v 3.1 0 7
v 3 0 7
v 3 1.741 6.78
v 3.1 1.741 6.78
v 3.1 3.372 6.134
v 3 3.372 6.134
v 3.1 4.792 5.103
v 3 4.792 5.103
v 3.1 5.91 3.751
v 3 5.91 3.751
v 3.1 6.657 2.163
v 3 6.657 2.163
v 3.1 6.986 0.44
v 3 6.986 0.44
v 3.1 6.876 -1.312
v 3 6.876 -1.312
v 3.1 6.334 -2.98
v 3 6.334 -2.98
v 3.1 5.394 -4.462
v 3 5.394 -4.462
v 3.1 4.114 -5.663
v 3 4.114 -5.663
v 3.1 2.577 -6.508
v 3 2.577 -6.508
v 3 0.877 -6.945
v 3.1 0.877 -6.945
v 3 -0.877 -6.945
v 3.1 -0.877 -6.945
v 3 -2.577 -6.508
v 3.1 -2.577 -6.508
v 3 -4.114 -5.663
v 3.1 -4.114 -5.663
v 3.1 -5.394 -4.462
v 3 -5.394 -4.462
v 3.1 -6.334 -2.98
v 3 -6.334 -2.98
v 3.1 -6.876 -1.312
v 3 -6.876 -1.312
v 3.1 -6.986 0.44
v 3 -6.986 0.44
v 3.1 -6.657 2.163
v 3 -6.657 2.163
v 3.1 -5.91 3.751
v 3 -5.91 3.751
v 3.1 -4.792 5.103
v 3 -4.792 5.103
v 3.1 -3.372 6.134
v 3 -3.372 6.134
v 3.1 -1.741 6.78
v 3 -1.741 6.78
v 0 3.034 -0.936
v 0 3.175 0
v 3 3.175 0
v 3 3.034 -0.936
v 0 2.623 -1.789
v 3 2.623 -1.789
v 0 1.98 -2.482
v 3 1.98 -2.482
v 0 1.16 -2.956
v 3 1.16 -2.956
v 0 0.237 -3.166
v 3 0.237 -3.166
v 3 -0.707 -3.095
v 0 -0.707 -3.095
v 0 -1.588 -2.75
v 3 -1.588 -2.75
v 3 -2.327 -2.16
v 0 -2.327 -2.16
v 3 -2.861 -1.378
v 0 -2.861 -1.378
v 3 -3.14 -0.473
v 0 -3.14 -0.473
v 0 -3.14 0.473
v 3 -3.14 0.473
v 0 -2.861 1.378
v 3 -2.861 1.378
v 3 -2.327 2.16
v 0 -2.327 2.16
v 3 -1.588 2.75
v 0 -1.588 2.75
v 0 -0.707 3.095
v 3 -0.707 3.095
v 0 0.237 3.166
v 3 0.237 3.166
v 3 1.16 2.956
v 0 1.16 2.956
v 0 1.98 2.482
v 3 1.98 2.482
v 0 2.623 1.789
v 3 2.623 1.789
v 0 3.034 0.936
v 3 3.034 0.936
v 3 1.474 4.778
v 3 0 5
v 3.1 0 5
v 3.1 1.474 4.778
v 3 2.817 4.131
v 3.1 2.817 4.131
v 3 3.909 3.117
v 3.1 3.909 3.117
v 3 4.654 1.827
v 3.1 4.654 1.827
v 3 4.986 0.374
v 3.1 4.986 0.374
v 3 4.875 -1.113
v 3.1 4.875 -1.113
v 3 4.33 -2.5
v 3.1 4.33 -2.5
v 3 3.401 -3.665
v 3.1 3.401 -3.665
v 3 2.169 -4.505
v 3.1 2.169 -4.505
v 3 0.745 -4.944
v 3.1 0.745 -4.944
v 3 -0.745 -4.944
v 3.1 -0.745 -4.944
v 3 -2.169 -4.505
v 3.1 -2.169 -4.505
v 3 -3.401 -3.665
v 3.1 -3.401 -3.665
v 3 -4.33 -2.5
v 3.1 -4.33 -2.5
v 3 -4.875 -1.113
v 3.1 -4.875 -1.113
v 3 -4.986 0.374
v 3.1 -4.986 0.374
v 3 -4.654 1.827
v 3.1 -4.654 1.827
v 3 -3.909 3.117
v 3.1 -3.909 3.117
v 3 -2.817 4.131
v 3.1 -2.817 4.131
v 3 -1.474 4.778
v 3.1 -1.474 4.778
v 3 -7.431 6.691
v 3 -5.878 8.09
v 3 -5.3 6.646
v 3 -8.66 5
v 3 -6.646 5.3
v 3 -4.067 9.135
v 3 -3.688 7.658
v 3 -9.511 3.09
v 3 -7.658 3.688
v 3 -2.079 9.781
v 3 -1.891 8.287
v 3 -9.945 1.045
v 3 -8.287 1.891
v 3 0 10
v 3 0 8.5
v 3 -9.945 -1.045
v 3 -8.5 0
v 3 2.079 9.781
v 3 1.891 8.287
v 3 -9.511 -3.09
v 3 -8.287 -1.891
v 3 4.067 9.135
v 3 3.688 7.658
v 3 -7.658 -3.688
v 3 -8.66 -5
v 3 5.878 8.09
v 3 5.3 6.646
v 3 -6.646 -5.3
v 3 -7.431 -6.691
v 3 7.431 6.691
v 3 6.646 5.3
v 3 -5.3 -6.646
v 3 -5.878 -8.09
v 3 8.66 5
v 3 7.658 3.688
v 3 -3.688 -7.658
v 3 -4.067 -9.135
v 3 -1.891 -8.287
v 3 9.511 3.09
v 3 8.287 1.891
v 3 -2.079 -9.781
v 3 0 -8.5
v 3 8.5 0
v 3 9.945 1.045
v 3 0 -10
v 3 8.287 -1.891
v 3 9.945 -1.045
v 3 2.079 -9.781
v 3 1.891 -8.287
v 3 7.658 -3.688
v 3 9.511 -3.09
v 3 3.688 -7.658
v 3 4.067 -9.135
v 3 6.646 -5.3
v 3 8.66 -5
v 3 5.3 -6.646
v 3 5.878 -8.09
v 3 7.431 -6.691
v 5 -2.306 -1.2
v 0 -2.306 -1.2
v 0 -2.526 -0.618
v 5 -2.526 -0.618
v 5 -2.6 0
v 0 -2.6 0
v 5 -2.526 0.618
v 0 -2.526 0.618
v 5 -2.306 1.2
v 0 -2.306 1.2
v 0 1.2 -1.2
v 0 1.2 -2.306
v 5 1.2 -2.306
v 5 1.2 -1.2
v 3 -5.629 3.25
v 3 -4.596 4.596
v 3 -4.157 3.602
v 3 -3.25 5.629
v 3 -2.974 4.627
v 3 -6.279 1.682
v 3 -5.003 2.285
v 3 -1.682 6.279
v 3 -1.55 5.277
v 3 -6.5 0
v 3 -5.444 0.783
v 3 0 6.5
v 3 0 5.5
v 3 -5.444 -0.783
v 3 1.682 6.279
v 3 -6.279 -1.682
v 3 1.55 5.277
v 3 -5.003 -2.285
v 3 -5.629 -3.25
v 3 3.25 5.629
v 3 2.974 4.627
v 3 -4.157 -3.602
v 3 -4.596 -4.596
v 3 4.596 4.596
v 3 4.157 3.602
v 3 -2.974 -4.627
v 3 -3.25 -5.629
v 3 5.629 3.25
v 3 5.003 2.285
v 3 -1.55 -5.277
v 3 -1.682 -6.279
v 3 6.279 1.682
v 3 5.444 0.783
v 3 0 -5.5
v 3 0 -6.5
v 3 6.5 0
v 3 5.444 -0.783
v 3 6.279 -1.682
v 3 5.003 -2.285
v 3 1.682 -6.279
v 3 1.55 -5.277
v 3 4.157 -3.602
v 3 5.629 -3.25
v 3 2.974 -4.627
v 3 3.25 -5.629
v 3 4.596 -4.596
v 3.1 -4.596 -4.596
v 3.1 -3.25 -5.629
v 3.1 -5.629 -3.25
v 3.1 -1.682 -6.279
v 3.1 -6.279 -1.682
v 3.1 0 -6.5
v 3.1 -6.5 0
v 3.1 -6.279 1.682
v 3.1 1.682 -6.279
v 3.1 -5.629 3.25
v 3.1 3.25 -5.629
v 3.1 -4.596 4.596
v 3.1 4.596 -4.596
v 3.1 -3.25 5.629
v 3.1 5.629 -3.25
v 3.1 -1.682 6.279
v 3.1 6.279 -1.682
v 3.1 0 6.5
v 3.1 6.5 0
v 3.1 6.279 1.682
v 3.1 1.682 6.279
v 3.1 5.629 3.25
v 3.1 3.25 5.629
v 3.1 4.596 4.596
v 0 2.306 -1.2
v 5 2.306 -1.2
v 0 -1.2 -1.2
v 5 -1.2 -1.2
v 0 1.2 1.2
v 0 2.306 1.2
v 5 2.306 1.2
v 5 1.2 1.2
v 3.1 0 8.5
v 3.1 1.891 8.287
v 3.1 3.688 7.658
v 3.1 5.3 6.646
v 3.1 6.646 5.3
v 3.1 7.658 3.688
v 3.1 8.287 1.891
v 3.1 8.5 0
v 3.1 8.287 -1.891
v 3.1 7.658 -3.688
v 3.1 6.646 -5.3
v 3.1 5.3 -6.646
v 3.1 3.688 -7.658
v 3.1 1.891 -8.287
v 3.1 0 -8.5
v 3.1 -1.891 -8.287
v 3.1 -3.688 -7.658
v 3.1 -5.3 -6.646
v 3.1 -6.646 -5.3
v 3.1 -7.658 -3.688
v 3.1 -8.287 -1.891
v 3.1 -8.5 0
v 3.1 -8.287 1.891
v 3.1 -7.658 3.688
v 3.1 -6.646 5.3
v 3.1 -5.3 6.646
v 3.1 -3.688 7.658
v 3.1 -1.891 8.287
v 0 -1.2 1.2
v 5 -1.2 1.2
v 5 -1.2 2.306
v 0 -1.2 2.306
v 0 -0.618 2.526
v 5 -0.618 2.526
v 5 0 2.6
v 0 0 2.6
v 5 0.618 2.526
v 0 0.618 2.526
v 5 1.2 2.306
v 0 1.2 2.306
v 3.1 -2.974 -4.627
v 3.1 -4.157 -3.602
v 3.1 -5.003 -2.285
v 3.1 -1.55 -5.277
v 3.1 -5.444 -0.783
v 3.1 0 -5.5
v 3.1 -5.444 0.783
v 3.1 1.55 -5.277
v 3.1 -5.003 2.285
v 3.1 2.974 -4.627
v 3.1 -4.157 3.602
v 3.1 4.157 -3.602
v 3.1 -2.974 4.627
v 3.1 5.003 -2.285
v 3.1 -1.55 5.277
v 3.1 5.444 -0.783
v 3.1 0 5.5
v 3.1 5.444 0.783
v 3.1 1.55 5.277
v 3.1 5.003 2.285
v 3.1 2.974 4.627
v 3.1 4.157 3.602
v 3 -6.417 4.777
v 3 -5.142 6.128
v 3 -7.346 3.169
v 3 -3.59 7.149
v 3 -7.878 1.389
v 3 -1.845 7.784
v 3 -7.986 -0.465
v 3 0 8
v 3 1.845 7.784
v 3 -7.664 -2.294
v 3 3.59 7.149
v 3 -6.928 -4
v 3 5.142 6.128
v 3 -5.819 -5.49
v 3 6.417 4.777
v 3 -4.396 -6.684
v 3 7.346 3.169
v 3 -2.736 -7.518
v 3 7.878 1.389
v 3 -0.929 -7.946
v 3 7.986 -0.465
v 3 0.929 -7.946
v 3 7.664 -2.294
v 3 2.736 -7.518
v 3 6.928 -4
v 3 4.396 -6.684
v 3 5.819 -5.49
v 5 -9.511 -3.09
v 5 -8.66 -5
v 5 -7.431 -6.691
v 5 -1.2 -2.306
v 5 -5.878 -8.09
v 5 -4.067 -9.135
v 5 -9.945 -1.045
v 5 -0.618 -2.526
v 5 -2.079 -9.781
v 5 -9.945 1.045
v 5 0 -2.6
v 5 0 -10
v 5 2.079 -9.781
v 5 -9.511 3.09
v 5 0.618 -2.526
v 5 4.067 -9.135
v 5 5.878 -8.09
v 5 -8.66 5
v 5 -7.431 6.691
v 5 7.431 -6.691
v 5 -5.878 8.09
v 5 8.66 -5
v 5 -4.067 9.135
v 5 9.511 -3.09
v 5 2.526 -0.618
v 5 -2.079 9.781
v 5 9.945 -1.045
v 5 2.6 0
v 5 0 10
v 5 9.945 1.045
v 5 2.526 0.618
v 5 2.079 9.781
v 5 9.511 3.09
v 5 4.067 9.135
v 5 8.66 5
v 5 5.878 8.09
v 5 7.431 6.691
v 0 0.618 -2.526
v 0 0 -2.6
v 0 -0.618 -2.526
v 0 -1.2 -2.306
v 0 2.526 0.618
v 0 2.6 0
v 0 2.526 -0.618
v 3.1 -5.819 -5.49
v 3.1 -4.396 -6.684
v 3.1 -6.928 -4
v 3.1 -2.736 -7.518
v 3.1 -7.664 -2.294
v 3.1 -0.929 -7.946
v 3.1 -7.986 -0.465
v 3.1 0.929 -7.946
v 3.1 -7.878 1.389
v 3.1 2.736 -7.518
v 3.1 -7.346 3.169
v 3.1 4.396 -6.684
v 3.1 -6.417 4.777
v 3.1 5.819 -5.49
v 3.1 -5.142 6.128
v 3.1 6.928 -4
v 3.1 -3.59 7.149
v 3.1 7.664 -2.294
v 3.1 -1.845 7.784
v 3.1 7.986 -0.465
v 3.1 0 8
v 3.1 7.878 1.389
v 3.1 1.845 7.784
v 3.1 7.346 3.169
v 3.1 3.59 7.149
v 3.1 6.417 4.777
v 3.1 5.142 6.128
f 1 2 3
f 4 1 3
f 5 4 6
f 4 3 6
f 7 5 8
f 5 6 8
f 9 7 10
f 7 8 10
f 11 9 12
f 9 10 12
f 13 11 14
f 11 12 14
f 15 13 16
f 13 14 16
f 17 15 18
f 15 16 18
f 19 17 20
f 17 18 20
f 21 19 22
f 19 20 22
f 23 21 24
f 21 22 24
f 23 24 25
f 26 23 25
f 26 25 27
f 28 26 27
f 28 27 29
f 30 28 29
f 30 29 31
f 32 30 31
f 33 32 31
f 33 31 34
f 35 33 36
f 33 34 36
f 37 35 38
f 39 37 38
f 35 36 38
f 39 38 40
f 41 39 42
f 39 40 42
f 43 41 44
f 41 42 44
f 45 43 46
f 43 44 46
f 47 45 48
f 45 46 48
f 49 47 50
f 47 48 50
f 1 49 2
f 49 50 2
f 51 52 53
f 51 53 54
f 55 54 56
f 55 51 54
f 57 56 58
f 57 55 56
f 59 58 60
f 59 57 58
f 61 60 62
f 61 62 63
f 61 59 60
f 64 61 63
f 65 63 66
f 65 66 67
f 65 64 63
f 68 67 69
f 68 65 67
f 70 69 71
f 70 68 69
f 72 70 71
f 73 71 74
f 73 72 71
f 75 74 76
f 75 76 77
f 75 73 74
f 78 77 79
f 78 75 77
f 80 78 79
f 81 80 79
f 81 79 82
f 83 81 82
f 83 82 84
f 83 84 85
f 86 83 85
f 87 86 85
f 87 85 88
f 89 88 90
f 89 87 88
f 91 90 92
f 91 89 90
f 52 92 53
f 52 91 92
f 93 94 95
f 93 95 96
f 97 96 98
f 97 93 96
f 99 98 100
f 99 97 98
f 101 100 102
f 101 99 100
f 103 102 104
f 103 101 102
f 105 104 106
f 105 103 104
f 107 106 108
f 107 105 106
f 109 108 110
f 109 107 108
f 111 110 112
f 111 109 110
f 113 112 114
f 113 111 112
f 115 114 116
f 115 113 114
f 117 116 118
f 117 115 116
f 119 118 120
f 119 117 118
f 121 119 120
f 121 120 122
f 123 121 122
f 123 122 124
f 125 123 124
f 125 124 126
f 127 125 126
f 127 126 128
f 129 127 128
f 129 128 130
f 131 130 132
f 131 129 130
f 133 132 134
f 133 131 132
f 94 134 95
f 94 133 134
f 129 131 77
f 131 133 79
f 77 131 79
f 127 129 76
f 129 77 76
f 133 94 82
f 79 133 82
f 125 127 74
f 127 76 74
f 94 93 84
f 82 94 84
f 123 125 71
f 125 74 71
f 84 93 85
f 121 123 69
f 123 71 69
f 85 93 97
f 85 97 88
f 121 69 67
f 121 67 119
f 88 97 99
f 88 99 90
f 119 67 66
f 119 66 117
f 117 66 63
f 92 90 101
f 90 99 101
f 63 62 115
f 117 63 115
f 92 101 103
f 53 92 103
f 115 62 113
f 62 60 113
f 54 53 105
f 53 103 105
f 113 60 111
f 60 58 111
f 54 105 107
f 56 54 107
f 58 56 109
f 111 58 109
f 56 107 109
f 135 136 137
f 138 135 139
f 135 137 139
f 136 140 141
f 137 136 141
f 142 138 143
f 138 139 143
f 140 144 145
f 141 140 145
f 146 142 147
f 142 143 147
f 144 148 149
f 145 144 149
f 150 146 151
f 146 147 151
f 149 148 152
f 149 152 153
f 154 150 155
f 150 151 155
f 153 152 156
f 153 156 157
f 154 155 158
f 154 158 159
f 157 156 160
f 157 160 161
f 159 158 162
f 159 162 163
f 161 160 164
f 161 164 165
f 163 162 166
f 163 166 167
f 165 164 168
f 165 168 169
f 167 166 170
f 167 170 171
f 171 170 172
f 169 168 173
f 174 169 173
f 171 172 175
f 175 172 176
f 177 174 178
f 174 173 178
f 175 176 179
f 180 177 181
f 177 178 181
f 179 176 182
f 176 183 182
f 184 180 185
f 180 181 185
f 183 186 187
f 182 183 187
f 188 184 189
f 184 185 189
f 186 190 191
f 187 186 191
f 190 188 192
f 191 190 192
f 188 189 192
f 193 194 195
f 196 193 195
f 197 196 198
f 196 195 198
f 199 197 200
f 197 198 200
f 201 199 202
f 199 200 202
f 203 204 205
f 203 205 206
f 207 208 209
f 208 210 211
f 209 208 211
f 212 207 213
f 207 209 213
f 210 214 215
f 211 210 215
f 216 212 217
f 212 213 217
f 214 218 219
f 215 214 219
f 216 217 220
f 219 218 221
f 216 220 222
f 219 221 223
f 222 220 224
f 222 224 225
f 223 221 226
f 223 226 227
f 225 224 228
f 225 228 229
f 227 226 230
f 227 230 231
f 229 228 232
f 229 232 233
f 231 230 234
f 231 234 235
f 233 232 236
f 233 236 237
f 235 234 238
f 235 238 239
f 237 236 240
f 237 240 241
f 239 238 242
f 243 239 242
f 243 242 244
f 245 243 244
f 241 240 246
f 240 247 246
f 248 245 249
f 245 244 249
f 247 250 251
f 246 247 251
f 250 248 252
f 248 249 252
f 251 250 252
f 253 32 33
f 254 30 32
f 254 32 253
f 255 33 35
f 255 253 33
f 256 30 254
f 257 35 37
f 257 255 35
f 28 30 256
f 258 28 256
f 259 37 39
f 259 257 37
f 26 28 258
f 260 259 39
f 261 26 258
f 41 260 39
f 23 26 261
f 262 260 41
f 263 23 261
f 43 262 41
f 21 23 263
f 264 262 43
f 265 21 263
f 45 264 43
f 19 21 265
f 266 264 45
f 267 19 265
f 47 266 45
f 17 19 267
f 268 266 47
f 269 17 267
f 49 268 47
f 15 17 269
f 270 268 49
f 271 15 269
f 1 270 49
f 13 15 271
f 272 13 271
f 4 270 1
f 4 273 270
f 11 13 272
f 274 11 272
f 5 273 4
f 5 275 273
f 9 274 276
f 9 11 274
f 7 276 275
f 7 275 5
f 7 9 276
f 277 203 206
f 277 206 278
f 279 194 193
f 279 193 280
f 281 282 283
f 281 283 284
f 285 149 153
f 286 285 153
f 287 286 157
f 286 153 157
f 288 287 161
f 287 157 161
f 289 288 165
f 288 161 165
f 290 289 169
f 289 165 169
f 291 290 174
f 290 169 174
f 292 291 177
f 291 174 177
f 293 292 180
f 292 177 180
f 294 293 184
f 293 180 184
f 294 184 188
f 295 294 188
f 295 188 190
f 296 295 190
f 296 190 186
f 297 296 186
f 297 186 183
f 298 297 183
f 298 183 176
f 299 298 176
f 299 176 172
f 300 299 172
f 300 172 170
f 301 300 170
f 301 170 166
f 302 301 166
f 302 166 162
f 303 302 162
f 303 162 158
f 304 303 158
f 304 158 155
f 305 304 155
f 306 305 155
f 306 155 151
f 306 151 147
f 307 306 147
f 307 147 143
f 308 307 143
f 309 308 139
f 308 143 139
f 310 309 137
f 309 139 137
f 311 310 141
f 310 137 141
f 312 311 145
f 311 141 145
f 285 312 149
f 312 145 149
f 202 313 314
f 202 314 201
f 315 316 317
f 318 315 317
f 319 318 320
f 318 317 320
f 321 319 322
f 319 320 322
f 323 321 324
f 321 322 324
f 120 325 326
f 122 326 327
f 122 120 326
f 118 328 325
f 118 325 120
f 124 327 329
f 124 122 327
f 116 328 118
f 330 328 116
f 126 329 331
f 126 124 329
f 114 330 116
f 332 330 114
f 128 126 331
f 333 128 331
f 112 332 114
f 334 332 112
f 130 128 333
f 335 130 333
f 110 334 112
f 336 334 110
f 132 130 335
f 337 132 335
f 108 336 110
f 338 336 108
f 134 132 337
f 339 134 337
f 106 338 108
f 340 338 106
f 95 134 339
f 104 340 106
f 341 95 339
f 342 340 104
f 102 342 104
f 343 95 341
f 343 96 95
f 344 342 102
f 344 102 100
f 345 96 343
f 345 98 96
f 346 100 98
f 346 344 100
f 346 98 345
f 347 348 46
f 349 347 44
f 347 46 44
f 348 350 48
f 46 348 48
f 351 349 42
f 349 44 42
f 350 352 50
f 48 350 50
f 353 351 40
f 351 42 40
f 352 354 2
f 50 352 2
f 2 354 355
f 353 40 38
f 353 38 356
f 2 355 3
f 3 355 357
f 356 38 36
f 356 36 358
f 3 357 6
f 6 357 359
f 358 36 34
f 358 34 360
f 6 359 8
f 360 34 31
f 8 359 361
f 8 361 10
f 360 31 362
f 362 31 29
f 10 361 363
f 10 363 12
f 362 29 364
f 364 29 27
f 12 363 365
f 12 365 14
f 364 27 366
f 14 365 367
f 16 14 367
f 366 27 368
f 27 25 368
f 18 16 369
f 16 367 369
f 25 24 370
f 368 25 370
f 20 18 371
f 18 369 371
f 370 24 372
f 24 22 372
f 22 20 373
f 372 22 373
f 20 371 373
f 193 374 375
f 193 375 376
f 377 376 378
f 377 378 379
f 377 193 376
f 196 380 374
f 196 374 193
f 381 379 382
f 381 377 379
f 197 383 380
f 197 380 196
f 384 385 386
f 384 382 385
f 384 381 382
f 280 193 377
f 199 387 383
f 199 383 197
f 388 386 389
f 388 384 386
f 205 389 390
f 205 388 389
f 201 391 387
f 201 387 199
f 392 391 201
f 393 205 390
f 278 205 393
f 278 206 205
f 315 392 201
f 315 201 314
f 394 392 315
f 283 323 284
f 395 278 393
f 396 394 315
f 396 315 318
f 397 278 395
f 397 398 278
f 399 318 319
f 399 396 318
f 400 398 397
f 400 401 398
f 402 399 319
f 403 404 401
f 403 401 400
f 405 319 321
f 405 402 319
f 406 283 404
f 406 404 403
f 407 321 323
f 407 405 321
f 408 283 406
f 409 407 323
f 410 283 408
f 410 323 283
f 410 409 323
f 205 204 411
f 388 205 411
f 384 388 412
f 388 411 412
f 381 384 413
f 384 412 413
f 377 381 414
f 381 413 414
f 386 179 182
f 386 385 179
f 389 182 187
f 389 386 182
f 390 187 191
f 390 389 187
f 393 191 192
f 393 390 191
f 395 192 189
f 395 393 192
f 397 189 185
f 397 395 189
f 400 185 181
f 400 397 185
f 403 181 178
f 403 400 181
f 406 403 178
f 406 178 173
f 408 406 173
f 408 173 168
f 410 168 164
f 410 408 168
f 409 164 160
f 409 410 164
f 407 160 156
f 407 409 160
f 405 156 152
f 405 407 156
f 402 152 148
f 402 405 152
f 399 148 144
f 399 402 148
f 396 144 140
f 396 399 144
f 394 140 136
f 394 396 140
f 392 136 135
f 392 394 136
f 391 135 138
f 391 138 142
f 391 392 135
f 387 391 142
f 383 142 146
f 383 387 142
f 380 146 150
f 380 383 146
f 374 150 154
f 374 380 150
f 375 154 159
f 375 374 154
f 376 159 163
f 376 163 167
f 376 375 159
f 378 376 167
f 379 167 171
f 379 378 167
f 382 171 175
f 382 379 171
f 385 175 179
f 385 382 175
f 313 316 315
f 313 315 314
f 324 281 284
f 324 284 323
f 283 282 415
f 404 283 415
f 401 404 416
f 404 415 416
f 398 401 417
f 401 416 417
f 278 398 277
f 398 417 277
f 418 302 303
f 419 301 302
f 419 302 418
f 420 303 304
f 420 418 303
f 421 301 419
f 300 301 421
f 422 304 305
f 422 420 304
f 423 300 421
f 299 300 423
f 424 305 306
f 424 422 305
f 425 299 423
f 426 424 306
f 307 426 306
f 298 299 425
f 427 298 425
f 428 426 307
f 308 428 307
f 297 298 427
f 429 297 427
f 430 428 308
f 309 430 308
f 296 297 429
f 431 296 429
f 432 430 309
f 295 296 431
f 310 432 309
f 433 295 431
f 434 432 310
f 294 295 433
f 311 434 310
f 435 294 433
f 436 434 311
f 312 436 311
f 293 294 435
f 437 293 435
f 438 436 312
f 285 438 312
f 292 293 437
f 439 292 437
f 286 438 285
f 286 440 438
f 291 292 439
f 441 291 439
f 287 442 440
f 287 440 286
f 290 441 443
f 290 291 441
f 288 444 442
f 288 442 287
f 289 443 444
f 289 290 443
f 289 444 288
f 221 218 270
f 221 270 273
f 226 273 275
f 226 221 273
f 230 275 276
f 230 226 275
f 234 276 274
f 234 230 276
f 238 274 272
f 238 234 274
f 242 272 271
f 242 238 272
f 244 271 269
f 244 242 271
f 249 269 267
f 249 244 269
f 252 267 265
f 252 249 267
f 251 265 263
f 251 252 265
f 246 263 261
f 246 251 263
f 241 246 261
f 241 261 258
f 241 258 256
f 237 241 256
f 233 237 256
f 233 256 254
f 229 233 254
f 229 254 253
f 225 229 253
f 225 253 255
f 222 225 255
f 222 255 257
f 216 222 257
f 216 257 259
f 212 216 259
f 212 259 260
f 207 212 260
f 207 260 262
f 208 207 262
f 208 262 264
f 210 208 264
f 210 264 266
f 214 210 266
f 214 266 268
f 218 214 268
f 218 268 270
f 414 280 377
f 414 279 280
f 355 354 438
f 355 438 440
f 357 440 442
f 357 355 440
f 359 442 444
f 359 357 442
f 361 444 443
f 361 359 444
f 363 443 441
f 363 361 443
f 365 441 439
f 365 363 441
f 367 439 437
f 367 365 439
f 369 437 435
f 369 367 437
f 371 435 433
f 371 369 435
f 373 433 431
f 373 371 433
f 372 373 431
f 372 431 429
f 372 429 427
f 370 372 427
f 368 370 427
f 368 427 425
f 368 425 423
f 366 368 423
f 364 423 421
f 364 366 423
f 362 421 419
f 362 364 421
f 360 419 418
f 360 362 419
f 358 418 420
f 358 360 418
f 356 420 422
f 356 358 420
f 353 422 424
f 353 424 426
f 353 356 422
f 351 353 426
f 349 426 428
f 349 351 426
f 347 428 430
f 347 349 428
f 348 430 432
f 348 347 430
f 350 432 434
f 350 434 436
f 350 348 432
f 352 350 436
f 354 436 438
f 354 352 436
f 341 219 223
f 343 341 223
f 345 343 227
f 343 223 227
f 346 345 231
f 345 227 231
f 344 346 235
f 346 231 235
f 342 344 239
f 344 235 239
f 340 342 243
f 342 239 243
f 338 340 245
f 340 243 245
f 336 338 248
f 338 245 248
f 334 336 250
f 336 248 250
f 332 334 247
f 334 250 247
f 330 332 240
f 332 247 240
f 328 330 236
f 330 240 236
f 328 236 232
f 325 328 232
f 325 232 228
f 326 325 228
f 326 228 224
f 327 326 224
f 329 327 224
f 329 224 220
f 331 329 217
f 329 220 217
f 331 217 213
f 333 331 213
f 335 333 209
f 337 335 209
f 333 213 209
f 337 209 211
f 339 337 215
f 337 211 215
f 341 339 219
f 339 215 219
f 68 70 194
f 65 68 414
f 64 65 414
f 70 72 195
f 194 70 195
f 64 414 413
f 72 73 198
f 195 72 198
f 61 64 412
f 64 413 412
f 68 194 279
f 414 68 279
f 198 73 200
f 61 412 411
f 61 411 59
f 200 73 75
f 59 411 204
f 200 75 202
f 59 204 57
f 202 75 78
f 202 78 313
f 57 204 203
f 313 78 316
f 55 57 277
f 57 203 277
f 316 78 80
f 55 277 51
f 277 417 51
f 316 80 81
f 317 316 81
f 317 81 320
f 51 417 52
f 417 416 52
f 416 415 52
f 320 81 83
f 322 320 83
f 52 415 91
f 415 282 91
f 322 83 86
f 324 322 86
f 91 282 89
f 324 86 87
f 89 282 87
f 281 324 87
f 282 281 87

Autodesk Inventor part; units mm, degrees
ref_plane "YZ Plane" through (0, 0, 0) normal (1, 0, 0) x (0, 1, 0)
ref_plane "XZ Plane" through (0, 0, 0) normal (0, 1, 0) x (-1, 0, 0)
ref_plane "XY Plane" through (0, 0, 0) normal (0, 0, 1) x (1, 0, 0)
sketch "Sketch3" plane through (0, 0, 0) normal (1, 0, 0) x (0, 1, 0)
  arc A0 (1.2, 2.3065) -> (-1.2, 2.3065) centre (0, 0) ccw
  line L0 (2.6, 1.2) -> (1.2, 1.2)
  line L1 (1.2, 1.2) -> (1.2, 2.6)
  line L2 (-1.2, 2.6) -> (-1.2, 1.2)
  line L3 (-1.2, 1.2) -> (-2.6, 1.2)
  line L4 (-2.6, -1.2) -> (-1.2, -1.2)
  line L5 (-1.2, -1.2) -> (-1.2, -2.6)
  line L6 (1.2, -2.6) -> (1.2, -1.2)
  line L7 (1.2, -1.2) -> (2.6, -1.2)
  arc A1 (-2.3065, 1.2) -> (-2.3065, -1.2) centre (0, 0) ccw
  arc A2 (-1.2, -2.3065) -> (1.2, -2.3065) centre (0, 0) ccw
  arc A3 (2.3065, -1.2) -> (2.3065, 1.2) centre (0, 0) ccw
  circle A4 centre (0, 0) radius 3.175
  dimension "d31" = 360
  dimension "d36" = 6.35
extrude "Extrusion3" add sketch "Sketch3" along normal blind 5
sketch "Sketch5" plane through (5, 0, 0) normal (1, 0, 0) x (0, 0, -1)
  circle A0 centre (0, 0) radius 2.6
  circle A1 centre (0, 0) radius 10
  dimension "d53" = 20
extrude "Extrusion4" add sketch "Sketch5" against normal blind 2
sketch "Sketch8" plane through (3, 0, 0) normal (-1, 0, 0) x (0, 0, 1)
  circle A0 centre (0, 0) radius 5
  circle A1 centre (0, 0) radius 5.5
  circle A2 centre (0, 0) radius 6.5
  circle A3 centre (0, 0) radius 7
  circle A4 centre (0, 0) radius 8
  circle A5 centre (0, 0) radius 8.5
  dimension "d54" = 10
  dimension "d55" = 11
  dimension "d56" = 13
  dimension "d57" = 14
  dimension "d58" = 16
  dimension "d59" = 17
extrude "Extrusion6" cut sketch "Sketch8" against normal blind 0.1
properties part number "omni-caster-lego-adaptor"
